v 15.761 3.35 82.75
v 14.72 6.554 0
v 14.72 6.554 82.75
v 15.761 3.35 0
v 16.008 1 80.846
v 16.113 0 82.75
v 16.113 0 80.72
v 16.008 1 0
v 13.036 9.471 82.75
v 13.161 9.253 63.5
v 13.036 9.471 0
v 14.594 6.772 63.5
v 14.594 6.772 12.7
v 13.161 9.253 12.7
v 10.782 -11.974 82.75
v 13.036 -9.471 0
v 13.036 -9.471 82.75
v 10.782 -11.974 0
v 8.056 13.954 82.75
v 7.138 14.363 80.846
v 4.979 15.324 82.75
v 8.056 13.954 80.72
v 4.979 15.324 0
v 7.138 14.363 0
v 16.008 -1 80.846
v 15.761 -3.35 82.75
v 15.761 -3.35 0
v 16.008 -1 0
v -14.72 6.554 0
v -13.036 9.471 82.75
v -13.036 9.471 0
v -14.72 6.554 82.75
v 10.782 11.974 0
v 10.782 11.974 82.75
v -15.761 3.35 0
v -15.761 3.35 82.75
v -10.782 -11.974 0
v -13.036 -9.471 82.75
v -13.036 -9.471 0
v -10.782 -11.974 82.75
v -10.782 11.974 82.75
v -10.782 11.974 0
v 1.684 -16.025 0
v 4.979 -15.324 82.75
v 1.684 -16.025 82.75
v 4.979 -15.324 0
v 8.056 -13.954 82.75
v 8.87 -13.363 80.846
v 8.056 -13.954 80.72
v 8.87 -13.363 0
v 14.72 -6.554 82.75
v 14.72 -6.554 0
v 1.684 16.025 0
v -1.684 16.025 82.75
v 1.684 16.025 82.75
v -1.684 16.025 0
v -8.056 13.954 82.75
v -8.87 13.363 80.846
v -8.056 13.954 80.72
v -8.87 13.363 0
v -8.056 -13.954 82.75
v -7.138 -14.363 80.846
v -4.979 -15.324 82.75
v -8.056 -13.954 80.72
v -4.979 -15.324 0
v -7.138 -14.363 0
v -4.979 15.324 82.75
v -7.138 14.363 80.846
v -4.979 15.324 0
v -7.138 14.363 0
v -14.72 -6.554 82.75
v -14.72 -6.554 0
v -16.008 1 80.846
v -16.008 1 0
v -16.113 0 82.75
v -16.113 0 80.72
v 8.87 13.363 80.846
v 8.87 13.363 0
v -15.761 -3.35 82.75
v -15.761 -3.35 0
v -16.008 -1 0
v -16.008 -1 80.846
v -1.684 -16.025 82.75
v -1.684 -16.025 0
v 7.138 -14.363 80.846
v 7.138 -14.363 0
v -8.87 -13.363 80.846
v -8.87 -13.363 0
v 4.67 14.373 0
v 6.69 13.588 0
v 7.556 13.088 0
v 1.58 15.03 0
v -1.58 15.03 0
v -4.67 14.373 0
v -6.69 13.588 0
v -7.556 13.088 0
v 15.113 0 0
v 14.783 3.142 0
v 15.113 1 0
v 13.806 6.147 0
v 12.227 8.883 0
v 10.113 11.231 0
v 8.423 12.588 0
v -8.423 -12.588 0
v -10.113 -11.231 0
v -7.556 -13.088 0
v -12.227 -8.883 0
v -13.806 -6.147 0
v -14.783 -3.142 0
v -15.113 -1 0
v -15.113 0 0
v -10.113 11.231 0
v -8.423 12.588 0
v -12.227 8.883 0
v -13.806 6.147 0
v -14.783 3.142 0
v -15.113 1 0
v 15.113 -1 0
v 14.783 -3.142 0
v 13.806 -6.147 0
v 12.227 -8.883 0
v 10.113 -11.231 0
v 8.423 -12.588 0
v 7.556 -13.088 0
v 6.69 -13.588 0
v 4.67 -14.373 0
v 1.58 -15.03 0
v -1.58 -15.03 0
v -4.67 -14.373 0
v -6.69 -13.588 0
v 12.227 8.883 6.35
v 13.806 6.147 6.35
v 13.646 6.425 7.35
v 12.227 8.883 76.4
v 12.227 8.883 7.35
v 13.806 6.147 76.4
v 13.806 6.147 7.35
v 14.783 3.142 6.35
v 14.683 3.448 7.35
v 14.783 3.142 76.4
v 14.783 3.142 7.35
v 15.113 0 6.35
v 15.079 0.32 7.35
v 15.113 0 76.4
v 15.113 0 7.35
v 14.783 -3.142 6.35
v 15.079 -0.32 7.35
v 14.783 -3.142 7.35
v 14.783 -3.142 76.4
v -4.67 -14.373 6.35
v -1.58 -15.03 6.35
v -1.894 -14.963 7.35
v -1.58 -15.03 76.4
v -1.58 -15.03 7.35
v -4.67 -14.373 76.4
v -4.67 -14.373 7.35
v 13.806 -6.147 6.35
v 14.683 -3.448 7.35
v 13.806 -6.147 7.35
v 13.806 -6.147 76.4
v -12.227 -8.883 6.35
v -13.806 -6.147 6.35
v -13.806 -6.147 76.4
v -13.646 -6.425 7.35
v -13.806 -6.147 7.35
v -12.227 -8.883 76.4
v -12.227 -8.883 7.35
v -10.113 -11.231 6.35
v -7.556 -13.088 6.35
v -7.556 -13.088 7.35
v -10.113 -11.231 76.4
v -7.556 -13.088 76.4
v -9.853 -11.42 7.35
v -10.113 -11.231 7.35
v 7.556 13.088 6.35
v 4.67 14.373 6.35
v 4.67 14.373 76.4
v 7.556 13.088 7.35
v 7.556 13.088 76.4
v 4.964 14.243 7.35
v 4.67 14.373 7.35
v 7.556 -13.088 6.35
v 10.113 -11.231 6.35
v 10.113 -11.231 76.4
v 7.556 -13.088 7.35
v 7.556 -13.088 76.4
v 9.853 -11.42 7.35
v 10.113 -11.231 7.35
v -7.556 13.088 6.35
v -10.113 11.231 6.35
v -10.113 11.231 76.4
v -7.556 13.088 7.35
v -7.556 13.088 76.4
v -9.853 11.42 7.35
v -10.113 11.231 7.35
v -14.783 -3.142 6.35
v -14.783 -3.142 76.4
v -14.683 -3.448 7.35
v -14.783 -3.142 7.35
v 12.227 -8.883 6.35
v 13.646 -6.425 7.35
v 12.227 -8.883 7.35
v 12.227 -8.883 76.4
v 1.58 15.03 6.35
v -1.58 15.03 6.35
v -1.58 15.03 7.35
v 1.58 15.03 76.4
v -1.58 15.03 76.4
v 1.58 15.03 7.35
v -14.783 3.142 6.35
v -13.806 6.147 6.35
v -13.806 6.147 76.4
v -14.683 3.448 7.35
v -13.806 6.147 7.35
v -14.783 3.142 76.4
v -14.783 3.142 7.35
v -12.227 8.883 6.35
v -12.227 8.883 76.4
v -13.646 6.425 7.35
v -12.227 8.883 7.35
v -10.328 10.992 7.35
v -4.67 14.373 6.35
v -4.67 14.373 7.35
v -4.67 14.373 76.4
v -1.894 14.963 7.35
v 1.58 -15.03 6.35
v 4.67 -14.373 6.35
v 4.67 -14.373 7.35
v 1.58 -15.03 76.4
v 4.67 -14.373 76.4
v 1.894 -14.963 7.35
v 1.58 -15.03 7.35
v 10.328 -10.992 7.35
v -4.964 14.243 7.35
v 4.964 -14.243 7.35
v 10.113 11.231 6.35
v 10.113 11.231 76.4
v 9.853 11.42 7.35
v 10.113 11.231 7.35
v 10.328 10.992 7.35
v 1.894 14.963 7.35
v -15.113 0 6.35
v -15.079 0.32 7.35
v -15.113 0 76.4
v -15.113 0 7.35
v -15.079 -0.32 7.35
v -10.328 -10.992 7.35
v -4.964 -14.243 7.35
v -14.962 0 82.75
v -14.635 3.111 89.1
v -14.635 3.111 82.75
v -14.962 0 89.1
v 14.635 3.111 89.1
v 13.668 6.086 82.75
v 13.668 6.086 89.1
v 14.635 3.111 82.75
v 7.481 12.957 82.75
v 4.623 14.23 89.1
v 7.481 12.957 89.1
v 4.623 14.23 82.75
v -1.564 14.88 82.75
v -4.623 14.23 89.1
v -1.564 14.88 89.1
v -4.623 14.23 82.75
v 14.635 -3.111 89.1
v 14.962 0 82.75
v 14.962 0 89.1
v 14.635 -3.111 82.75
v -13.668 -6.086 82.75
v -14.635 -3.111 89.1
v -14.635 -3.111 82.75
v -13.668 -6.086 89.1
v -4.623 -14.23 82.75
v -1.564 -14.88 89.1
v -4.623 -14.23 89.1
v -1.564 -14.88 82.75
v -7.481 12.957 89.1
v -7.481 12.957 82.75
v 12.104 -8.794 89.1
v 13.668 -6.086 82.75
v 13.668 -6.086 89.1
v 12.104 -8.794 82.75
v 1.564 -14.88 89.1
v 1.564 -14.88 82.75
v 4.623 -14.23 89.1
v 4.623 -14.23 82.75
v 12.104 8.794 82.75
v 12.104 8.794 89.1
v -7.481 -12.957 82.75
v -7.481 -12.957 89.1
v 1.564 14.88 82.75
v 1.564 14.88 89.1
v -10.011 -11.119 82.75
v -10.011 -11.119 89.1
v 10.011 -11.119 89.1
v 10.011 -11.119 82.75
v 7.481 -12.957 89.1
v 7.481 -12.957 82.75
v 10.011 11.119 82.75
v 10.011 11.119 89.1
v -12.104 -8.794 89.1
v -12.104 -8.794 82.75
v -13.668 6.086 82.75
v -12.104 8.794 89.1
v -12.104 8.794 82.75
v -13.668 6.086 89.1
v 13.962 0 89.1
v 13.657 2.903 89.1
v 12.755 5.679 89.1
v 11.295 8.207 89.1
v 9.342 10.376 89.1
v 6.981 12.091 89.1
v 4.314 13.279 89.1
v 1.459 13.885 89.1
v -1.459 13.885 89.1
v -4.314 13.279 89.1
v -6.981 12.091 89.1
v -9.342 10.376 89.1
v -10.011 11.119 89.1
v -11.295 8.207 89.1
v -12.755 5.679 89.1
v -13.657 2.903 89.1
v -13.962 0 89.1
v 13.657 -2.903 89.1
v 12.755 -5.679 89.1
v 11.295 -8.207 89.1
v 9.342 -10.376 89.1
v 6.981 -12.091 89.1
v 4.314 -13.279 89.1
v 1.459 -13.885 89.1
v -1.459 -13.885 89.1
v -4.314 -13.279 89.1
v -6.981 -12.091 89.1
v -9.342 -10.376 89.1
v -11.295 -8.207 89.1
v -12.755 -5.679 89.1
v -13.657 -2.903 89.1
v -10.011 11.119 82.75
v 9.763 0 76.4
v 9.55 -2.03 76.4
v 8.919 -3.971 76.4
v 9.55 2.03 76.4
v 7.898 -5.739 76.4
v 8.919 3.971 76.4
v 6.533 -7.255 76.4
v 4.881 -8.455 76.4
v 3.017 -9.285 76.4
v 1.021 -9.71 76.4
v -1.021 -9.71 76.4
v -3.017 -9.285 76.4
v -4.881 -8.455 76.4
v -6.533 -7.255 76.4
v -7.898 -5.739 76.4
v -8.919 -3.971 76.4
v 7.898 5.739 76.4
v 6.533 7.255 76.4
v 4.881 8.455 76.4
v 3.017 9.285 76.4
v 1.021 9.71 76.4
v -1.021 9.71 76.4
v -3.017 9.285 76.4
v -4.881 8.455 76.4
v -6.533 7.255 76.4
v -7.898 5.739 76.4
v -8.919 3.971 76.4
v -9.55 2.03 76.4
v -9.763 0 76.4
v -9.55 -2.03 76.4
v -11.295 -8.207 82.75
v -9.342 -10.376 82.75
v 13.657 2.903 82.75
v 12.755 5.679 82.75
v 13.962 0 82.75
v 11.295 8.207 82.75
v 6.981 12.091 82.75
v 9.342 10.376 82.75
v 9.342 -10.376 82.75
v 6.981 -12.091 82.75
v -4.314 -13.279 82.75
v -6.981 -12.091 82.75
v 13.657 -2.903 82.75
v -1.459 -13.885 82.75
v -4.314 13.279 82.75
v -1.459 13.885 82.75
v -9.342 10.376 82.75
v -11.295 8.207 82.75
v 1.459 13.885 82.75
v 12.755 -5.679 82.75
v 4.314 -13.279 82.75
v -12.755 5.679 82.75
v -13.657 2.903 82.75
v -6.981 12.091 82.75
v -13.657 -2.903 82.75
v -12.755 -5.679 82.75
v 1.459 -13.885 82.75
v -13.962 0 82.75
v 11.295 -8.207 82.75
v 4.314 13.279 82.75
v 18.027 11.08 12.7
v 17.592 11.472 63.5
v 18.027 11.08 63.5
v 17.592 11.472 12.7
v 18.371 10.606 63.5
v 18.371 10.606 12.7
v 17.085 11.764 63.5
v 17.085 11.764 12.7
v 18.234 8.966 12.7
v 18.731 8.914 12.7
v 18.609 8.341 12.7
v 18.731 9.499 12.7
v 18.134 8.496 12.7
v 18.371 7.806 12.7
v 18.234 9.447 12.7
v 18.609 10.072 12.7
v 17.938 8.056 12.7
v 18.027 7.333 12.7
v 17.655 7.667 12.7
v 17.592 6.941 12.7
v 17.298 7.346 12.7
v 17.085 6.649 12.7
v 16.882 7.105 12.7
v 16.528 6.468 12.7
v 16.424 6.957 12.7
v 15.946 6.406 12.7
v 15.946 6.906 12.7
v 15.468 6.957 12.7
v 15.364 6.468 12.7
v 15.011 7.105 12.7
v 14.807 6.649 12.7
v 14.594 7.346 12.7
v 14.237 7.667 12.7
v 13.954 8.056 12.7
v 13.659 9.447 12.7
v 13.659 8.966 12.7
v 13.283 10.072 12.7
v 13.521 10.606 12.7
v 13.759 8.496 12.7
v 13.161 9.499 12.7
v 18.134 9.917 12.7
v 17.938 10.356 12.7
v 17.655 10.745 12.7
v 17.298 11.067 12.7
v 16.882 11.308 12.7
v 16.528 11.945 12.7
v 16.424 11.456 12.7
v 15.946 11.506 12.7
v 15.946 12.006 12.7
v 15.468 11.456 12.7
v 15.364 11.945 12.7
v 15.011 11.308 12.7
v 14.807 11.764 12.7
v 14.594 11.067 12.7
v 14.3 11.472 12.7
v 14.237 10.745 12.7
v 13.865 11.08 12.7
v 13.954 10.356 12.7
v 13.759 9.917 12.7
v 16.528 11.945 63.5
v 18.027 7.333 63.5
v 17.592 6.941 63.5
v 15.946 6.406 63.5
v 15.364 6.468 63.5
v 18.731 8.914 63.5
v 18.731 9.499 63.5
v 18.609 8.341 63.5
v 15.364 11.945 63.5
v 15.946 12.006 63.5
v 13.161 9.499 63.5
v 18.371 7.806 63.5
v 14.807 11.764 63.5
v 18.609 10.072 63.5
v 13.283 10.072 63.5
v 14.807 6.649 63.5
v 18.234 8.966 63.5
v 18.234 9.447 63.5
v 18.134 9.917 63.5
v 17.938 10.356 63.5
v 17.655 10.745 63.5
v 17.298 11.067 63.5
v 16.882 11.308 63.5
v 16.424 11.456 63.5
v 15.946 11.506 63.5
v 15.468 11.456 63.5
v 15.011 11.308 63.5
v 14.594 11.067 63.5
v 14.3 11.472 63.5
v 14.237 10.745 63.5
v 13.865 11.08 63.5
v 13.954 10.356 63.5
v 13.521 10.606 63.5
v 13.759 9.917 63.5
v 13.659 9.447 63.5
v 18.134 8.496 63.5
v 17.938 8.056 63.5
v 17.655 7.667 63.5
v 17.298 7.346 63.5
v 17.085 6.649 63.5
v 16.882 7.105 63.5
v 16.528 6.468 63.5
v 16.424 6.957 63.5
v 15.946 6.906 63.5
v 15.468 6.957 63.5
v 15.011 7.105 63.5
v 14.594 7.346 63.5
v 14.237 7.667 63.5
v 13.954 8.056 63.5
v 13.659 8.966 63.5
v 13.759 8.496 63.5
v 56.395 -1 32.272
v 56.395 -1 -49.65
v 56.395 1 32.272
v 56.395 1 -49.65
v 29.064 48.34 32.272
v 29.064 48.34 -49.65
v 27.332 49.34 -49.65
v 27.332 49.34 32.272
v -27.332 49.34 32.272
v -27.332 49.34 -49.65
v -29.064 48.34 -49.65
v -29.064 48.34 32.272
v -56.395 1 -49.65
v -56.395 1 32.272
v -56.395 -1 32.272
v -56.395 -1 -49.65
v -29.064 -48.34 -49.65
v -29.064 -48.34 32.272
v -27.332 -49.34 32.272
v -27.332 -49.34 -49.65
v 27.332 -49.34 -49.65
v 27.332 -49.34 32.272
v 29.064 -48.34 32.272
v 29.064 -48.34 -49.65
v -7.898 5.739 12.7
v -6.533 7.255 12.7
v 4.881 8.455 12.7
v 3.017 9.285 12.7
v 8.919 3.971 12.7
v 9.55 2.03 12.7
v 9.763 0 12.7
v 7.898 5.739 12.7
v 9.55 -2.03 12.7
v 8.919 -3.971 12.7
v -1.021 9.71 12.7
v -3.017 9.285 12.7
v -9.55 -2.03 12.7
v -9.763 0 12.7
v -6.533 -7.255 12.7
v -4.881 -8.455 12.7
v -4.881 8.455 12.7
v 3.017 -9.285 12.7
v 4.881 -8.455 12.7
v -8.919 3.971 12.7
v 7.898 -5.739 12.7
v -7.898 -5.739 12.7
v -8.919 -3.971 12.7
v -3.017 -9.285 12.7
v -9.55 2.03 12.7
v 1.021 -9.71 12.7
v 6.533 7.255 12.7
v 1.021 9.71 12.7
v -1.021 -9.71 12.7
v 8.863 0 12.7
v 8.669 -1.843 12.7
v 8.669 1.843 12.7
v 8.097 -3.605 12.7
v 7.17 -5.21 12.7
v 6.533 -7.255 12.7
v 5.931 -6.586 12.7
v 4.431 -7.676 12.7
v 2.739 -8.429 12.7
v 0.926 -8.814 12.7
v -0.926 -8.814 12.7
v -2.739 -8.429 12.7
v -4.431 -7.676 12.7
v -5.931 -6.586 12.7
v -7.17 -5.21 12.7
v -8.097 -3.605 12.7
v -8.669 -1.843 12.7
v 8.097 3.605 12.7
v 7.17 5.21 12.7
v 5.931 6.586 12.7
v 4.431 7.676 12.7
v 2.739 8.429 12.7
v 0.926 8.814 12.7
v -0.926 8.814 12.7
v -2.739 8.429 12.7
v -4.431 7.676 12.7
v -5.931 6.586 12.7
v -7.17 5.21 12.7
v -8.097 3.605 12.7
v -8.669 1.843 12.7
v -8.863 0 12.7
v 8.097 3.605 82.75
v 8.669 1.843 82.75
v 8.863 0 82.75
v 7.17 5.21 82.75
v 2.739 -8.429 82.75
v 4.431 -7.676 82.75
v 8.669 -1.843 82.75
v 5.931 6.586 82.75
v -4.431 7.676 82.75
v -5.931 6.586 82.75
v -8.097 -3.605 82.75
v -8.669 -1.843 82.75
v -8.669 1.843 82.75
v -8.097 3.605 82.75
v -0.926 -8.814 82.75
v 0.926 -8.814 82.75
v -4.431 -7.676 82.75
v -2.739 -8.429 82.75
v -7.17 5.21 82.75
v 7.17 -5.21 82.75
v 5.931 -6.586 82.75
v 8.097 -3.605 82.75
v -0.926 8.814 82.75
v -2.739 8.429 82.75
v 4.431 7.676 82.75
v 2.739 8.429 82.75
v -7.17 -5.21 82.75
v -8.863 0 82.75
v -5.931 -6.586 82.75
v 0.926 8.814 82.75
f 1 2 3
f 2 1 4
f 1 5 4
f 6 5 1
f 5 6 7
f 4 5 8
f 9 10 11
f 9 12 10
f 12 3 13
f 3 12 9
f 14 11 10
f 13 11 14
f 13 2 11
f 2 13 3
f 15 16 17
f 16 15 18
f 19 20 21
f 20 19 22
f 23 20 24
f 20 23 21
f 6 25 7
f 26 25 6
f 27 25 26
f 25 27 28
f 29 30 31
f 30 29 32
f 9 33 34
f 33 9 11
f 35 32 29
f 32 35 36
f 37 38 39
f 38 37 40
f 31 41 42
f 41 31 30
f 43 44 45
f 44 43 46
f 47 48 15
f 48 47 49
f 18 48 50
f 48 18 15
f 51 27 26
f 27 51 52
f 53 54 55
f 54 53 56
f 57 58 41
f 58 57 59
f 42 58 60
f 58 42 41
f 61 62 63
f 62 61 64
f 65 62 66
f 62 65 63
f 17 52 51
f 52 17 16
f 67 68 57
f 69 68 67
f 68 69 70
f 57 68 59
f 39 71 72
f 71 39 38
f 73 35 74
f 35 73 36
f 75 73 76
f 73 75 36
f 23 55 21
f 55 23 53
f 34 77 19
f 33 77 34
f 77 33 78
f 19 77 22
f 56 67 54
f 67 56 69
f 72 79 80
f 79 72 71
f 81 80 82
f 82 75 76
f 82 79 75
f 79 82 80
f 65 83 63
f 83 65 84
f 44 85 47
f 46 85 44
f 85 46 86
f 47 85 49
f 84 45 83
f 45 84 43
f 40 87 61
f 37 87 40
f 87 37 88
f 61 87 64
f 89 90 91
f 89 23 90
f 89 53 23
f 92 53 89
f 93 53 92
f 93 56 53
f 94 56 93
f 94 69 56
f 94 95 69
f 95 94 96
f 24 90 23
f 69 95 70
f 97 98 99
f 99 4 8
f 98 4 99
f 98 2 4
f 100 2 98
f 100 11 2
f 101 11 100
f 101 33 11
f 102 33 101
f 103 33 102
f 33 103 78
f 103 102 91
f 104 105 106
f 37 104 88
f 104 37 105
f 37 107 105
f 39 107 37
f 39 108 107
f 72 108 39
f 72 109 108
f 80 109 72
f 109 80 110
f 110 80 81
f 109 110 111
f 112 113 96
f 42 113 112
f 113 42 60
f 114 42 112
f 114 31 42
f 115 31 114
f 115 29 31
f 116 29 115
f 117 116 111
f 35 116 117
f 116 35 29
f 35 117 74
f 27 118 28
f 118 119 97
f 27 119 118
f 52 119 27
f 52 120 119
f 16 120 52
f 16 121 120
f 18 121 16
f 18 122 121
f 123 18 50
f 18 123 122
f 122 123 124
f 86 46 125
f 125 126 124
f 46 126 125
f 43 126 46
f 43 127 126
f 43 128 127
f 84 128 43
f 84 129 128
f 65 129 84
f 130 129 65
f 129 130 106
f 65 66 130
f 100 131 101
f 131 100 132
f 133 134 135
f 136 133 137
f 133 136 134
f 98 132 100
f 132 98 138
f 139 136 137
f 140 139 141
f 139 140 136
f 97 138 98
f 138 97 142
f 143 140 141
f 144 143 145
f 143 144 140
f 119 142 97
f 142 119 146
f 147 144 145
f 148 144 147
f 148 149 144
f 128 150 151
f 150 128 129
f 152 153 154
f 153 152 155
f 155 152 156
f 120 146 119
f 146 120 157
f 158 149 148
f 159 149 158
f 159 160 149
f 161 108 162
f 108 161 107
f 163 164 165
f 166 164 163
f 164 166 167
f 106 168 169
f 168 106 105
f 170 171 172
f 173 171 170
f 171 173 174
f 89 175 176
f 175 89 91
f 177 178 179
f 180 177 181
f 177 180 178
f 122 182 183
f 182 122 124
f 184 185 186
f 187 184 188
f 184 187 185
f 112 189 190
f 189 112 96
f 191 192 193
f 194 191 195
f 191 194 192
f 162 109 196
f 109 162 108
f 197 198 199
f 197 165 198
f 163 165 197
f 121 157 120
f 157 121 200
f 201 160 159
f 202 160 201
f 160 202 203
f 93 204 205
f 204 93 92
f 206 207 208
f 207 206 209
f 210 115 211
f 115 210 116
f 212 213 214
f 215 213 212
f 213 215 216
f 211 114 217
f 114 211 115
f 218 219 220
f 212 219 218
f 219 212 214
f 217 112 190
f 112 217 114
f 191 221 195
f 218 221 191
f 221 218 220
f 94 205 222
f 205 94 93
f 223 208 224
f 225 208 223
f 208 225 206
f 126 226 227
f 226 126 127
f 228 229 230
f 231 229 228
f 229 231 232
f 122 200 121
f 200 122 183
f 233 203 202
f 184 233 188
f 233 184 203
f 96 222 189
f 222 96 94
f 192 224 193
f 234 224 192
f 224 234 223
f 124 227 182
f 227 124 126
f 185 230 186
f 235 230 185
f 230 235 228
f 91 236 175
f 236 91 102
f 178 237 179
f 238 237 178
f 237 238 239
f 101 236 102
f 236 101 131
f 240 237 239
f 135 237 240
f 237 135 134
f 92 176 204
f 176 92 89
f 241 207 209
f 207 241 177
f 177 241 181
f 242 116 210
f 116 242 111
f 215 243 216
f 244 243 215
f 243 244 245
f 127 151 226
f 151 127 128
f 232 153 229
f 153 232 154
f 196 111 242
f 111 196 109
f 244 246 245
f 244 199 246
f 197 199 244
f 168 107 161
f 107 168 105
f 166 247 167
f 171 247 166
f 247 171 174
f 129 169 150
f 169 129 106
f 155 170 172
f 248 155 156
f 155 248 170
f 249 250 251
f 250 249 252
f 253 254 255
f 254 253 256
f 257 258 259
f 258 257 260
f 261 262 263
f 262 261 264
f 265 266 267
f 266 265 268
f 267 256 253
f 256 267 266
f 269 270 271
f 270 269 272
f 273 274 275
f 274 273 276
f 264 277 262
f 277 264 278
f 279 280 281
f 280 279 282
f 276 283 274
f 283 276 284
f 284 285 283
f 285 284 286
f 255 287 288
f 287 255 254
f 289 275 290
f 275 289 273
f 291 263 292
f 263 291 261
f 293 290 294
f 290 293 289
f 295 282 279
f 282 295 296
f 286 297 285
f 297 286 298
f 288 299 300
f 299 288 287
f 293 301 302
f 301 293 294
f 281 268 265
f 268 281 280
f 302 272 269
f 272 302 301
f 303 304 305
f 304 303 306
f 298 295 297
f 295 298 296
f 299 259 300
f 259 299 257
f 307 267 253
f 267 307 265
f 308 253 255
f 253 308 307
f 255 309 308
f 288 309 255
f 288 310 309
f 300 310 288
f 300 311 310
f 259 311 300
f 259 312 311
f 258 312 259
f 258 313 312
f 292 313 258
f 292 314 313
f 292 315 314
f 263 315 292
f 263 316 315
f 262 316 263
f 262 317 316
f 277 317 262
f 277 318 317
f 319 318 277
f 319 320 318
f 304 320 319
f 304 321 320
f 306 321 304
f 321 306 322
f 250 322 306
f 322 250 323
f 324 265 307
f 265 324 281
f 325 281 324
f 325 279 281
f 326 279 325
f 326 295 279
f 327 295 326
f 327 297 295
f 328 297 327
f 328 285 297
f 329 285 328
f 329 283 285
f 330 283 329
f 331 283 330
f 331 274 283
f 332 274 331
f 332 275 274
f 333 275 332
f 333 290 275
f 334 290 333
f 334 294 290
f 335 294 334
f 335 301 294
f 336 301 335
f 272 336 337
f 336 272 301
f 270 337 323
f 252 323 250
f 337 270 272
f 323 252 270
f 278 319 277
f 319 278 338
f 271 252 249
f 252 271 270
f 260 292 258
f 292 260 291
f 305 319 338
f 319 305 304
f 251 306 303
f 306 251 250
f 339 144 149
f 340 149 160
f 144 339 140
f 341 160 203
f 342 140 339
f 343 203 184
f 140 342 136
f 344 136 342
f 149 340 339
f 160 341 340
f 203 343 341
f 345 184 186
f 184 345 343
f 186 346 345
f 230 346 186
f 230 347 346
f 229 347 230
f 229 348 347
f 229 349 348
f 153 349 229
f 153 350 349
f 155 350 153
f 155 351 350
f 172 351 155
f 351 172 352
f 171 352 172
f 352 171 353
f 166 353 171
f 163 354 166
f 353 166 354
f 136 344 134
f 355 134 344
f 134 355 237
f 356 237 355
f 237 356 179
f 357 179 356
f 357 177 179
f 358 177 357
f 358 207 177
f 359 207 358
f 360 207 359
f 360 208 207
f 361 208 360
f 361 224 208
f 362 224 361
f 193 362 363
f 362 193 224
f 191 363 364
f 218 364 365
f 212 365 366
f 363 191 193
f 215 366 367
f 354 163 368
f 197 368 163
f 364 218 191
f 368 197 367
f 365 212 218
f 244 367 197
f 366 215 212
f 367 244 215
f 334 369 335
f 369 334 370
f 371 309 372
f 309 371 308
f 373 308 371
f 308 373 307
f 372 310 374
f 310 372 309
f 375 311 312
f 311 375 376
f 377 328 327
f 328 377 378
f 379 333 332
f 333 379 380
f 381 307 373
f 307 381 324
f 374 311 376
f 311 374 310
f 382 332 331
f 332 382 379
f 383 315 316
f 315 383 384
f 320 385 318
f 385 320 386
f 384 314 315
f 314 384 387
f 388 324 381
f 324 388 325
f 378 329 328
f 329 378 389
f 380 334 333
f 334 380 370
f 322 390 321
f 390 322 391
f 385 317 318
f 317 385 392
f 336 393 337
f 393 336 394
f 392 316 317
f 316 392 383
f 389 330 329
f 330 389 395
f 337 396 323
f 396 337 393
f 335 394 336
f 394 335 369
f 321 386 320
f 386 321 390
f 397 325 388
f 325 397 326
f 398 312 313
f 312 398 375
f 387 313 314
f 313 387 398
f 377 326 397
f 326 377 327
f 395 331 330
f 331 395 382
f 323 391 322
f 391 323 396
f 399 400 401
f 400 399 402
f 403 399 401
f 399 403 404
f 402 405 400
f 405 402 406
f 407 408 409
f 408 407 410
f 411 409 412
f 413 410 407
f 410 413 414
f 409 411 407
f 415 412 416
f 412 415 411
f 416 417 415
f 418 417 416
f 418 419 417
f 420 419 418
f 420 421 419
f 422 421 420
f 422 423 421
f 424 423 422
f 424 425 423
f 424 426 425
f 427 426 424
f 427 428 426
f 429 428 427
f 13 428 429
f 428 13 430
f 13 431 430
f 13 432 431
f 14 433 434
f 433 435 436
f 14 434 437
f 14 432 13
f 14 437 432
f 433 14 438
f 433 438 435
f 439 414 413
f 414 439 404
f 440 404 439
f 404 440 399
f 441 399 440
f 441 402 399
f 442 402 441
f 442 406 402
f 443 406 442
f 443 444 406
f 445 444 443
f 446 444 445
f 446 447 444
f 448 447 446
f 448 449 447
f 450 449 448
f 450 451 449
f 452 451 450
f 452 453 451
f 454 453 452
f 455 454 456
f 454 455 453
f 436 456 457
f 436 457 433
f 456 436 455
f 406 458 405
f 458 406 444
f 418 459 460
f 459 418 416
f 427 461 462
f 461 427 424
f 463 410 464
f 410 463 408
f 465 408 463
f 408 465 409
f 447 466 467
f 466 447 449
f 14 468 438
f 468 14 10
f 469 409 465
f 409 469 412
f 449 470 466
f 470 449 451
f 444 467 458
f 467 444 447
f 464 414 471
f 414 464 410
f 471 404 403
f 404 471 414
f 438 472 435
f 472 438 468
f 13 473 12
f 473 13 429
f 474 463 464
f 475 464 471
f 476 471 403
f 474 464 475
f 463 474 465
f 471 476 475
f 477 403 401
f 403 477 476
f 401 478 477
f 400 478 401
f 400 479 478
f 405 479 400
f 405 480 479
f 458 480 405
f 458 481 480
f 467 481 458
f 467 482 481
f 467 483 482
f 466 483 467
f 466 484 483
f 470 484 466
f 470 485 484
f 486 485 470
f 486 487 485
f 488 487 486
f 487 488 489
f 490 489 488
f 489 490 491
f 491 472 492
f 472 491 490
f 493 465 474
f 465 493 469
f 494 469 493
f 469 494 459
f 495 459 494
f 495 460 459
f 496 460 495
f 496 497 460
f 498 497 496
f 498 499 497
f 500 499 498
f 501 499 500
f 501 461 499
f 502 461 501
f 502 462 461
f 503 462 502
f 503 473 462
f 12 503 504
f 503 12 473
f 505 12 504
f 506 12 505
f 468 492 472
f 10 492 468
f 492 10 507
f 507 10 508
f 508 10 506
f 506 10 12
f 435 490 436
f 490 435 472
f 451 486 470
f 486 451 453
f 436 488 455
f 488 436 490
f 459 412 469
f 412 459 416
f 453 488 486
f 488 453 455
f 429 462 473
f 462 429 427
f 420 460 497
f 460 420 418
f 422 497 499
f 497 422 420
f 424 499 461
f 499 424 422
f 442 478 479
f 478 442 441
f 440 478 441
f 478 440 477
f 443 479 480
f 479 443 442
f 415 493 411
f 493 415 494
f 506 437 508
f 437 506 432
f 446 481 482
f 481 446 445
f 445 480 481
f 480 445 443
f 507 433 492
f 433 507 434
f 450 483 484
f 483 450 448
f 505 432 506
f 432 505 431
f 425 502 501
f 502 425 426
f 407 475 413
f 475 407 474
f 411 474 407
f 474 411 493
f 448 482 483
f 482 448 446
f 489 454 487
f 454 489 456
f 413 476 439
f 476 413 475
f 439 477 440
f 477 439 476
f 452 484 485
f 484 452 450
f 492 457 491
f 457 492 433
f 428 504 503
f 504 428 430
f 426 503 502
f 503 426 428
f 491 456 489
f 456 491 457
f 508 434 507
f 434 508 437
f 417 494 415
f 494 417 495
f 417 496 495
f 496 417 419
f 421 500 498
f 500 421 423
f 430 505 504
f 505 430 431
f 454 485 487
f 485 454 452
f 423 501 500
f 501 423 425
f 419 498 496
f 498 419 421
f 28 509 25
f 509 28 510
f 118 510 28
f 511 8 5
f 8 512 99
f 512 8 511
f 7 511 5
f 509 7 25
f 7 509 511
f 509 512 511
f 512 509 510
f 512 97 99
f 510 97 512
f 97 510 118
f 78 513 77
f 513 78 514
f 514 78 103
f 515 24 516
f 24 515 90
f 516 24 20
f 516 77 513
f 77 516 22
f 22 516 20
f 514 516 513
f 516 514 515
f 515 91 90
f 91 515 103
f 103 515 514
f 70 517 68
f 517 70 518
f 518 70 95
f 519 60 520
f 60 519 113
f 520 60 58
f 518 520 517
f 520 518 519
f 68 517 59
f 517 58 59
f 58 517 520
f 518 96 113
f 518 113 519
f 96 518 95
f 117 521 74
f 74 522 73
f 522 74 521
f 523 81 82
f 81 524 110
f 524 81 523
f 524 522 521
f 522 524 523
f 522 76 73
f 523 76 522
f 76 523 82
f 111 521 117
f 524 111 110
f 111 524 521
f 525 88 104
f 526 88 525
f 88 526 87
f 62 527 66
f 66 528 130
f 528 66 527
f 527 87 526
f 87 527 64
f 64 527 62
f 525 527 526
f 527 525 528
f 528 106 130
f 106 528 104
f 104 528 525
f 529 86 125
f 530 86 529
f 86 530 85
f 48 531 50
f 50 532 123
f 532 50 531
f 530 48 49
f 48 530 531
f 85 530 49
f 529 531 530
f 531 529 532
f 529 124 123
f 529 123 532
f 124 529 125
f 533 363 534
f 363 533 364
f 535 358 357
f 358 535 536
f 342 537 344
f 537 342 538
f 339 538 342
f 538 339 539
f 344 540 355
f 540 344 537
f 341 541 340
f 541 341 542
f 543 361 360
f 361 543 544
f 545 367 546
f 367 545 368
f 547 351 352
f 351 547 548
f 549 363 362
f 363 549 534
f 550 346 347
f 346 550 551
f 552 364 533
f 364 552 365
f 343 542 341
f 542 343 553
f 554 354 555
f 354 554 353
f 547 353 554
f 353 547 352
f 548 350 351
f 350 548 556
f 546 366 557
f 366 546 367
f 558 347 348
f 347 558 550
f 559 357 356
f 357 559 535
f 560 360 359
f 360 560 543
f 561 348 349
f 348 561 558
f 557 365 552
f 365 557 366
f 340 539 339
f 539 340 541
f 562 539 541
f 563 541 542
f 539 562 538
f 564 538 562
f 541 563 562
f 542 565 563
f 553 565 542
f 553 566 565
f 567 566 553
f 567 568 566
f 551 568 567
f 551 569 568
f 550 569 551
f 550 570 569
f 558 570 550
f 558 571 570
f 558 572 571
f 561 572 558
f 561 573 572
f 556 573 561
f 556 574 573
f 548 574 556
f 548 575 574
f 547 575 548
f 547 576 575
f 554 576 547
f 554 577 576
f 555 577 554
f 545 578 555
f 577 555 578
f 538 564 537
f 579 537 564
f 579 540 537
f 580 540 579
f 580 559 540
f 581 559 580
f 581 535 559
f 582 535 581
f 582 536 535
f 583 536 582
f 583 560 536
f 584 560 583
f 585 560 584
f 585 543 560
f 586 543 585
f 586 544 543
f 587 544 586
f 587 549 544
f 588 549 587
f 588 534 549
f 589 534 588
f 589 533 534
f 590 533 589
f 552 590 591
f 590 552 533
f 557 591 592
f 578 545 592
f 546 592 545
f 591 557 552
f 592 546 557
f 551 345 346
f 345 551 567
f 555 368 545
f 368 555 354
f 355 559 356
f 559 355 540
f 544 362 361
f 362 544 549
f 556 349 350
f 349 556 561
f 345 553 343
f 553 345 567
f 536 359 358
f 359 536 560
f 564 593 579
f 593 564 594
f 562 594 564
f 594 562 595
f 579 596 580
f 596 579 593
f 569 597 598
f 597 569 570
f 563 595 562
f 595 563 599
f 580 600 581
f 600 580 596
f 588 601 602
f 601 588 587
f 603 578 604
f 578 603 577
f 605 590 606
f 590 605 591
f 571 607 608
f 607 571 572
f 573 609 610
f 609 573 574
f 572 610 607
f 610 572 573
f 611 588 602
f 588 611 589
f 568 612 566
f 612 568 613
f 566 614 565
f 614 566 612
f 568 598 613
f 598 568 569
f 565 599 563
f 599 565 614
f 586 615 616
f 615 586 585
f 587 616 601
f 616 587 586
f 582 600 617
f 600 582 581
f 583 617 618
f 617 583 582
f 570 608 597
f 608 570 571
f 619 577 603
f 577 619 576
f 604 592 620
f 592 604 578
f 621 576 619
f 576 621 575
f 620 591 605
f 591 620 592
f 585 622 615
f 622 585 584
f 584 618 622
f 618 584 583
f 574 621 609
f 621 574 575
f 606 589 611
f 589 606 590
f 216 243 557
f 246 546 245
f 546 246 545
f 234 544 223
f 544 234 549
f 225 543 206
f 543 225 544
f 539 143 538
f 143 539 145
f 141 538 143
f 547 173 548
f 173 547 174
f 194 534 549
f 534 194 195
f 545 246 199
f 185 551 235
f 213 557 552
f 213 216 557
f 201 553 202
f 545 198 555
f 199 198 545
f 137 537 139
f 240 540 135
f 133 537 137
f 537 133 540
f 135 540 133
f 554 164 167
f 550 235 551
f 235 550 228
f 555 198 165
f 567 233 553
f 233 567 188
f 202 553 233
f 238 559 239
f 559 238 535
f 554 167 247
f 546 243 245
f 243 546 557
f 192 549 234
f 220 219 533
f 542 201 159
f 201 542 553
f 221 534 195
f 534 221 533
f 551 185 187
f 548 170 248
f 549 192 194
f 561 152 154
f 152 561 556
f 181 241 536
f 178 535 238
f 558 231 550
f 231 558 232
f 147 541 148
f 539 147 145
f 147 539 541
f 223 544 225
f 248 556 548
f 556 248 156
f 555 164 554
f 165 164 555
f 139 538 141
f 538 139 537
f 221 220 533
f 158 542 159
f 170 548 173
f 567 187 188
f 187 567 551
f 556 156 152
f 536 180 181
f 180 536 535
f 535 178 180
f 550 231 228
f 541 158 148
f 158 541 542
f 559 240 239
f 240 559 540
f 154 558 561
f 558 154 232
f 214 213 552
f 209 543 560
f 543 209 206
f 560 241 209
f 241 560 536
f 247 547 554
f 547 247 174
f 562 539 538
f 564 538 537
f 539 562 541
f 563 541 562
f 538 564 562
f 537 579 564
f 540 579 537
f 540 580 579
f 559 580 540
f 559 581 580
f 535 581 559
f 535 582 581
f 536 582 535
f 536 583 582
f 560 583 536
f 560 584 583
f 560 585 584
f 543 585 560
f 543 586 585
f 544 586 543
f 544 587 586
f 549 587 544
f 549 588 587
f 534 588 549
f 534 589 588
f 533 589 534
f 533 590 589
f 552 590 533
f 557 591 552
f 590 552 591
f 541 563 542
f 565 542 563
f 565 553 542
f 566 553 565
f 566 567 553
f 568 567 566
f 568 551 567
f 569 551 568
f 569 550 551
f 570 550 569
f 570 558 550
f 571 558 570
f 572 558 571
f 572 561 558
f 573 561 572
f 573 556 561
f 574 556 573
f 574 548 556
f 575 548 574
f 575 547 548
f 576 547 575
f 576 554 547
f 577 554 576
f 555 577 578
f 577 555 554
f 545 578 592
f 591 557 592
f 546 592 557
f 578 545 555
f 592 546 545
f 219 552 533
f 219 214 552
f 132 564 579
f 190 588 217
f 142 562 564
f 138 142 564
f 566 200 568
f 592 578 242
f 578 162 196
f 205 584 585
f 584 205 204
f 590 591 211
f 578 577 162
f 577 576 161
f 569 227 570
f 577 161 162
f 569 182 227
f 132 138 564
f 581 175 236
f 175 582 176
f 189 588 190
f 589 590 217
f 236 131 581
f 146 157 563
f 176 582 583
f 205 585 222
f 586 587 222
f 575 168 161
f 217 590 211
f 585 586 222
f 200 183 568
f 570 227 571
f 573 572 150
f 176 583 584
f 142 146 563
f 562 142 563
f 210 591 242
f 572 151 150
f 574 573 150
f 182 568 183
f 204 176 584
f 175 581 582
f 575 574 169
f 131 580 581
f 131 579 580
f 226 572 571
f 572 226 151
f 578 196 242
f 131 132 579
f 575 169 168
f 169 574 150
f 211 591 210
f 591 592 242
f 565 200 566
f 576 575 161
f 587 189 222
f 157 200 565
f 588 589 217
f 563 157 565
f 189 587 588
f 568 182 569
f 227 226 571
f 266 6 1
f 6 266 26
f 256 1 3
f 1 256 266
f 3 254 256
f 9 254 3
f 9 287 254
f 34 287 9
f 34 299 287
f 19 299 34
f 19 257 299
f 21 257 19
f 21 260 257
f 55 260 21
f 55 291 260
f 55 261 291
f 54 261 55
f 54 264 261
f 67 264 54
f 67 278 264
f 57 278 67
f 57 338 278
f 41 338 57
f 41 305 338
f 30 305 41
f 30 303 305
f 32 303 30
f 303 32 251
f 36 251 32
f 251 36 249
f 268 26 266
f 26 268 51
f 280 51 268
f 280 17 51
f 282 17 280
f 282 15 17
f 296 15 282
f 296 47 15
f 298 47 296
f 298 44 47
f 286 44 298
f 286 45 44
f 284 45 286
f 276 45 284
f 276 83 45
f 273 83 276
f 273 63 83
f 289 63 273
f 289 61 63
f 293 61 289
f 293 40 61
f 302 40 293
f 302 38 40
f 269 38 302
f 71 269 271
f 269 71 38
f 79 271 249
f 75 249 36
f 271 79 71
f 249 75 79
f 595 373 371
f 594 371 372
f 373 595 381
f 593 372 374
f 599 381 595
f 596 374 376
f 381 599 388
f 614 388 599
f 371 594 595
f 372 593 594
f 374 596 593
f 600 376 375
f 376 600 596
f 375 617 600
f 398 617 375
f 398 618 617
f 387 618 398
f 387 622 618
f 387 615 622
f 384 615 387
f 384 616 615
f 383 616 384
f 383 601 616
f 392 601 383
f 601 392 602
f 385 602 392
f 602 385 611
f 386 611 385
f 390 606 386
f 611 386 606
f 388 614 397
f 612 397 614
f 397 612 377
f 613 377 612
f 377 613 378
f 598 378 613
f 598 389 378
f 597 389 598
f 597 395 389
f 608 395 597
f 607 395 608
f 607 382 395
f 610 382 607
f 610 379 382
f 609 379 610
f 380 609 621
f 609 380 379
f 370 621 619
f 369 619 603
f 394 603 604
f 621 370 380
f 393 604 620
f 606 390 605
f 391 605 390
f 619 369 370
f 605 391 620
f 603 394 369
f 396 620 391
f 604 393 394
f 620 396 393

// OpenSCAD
// file: rockit.scad
// Rockit - Model Rocket Construction Kit
//
// Giles Hall (C) 2012,2013
//
// Tail fin code based on:
// - Lutz Paelke (lpaelke) - http://www.thingiverse.com/thing:26508/

function in2mm(in) = in / 0.0393701;


/////////////////
// Rocket Parts
// Some of these are mutually exclusive
engine_holder_enabled = 0;
body_enabled = 0;
fins_enabled = 0;
collar_enabled = 0;
guide_enabled = 0;
nosecone_enabled = 0;

/////////////////
// Engine Dimensions
// http://www2.estesrockets.com/pdf/Estes_Model_Rocket_Engines.pdf
// mini engine
mini_engine_pad = 0.2;
mini_engine_gap = in2mm(.5);
mini_engine_length = in2mm(1.75);
mini_engine_dia = in2mm(.5);
// standard engine
standard_engine_pad = 0.2;
standard_engine_gap = in2mm(.5);
standard_engine_length = in2mm(2.75);
standard_engine_dia = in2mm(.69);
// D engine
d_engine_pad = 0.2;
d_engine_gap = in2mm(1);
d_engine_length = in2mm(2.75);
d_engine_dia = in2mm(.95);
// E engine
e_engine_pad = 0.2;
e_engine_gap = in2mm(.5);
e_engine_length = in2mm(3.75);
e_engine_dia = in2mm(.95);
// engine selection
engine_length = standard_engine_length;
engine_dia = standard_engine_dia;
engine_gap = standard_engine_gap;
engine_pad = standard_engine_pad;

/////////////////
// Global
wall_thickness = 2;
collar_height = in2mm(.25);

/////////////////
// Engine Holder
engine_holder_overhang = 20;
engine_holder_inner_dia = engine_dia + engine_pad;
engine_holder_outer_dia = engine_dia + wall_thickness;
engine_holder_length = engine_length + engine_pad;
engine_holder_offset = collar_height;
engine_holder_firewall_length = in2mm(.25);

/////////////////
// Body
//body_height = engine_holder_length + engine_holder_offset + engine_holder_offset + in2mm(.2);
body_height = engine_holder_length + engine_holder_offset + engine_holder_offset;
body_inner_dia = engine_dia + engine_gap;
body_outer_dia = body_inner_dia + wall_thickness;

/////////////////
// Fins
fin_count = 6;
fin_span = body_outer_dia * 3.5;
fin_thickness = wall_thickness;
fin_endchord = body_height * .6;
fin_sym_flag = 1;
//fin_offset = fin_endchord;
fin_offset = 0;
fin_coverage = .99;
fin_height = (body_height - fin_offset) * fin_coverage;

/////////////////
// Collar
collar_overlap = collar_height;
collar_fit = .990;
collar_outer_dia = body_inner_dia * collar_fit;
collar_inner_dia = collar_outer_dia - wall_thickness;

/////////////////
// Guide
guide_inner_dia = 4.6;
guide_outer_dia = guide_inner_dia + 1;
guide_height = in2mm(2);
guide_offset = in2mm(.5);

/////////////////
// Nosecone
nosecone_height = body_height;
nosecone_inner_dia = body_inner_dia;
nosecone_outer_dia = body_outer_dia;

/////////////////
// Quality
circle_segments = 30;

module fin(angle, deflection)
{
    translate([0,0,fin_offset])
    rotate([0,0,angle])
        polyhedron(points=[
        // inner-bottom
        [body_inner_dia / 2, fin_thickness / 2 + deflection, 0], 
        [body_inner_dia / 2, -fin_thickness / 2 + deflection, 0],
        // outer-bottom
        [fin_span / 2, fin_thickness / 2 + deflection, fin_sym_flag ? -fin_endchord : 0], 
        [fin_span / 2, -fin_thickness / 2 + deflection, fin_sym_flag ? -fin_endchord : 0],
        // outer-top
        [fin_span / 2, fin_thickness / 2 - deflection, fin_height - fin_endchord], 
        [fin_span / 2, -fin_thickness / 2 - deflection, fin_height - fin_endchord],
        // inner-top
        [body_inner_dia / 2, fin_thickness / 2 - deflection, fin_height],
        [body_inner_dia / 2, -fin_thickness / 2 - deflection, fin_height]],
        triangles=[[0, 1, 2],  [1, 3, 2], 
                    [2, 3, 4],  [3, 5, 4], 
                    [4, 5, 6],  [5, 7, 6], 
                    [6, 7, 0],  [7, 1, 0], 
                    [0, 2, 6],  [2, 4, 6], 
                    [1, 7, 3],  [3, 7, 5]]);
}

module tube(name, length, outer_dia, inner_dia)
{
    echo(str("Tube [", name, "]: ", length, "mm len, ", outer_dia, "mm OD, ", inner_dia, "mm ID"));
    difference()
    {
        // outer
        cylinder(h=length, r=outer_dia / 2, $fn=circle_segments);
        // inner
        cylinder(h=length, r=inner_dia / 2, $fn=circle_segments);
    }
}

module tube2(name, length, outer_dia1, inner_dia1, outer_dia2, inner_dia2)
{
    echo(str("Tube2 [", name, "]: ", length, "mm len, ", outer_dia1, "mm OD1, ", inner_dia1, "mm ID1", outer_dia2, "mm OD2, ", inner_dia2, "mm ID2"));
    difference()
    {
        // outer
        cylinder(h=length, r1=outer_dia1 / 2, r2=outer_dia2 / 2, $fn=circle_segments);
        // inner
        cylinder(h=length, r1=inner_dia1 / 2, r2=inner_dia2 / 2, $fn=circle_segments);
    }
}

module make_guide() 
{
    if (guide_enabled)
    {
        echo(str("Making guide"));
		rotate([0, 0, 180 / fin_count]) 
        translate([body_outer_dia / 2 + guide_inner_dia / 2, 0, guide_offset])
        tube("guide", guide_height, guide_outer_dia, guide_inner_dia);
    }
}

module make_fins() 
{
    if (fins_enabled)
    {
        echo(str("Making fins"));
		for (i = [0:fin_count - 1])
        {
            fin(i * (360 / fin_count), 0);
        }
    }
}

module make_collar()
{
    if (collar_enabled)
    {
        echo(str("Making collar"));
        translate([0, 0, body_height - collar_overlap]) 
        tube("collar", collar_height + collar_overlap, collar_outer_dia, collar_inner_dia);
    }
}

module make_engine_holder()
{
    if (engine_holder_enabled)
    {
        echo(str("Making engine holder"));
        union()
        {
            // engine offset
            translate([0, 0, engine_holder_offset * 2])
            tube("engine tube", engine_holder_length, engine_holder_outer_dia, engine_holder_inner_dia);
            // engine collar
            translate([0, 0, engine_holder_offset])
            tube2("engine tube", engine_holder_offset, body_outer_dia, body_inner_dia, engine_holder_outer_dia, engine_holder_inner_dia);
            // engine firewall
            translate([0, 0, engine_holder_offset + engine_holder_length])
            tube("engine firewall", engine_holder_firewall_length, body_outer_dia, engine_holder_inner_dia);
        }
    }
}

module make_body()
{
    if (body_enabled)
    {
        echo(str("Making body"));
        tube("body", body_height, body_outer_dia, body_inner_dia);
    }
}

module make_nosecone()
{
    if (nosecone_enabled)
    {
        echo(str("Making nosecone"));
        tube("nosecone", nosecone_height, nosecone_inner_dia, nosecone_outer_dia);
    }
}

module make_rockit()
{
    union()
    {
        make_body();
        make_collar();
        make_guide();
        make_fins();
        make_engine_holder();
        make_nosecone();
    }
}
// main file
include <rockit.scad>;
engine_holder_enabled = 1;
body_enabled = 1;
fins_enabled = 1;
collar_enabled = 1;
guide_enabled = 1;
make_rockit();
